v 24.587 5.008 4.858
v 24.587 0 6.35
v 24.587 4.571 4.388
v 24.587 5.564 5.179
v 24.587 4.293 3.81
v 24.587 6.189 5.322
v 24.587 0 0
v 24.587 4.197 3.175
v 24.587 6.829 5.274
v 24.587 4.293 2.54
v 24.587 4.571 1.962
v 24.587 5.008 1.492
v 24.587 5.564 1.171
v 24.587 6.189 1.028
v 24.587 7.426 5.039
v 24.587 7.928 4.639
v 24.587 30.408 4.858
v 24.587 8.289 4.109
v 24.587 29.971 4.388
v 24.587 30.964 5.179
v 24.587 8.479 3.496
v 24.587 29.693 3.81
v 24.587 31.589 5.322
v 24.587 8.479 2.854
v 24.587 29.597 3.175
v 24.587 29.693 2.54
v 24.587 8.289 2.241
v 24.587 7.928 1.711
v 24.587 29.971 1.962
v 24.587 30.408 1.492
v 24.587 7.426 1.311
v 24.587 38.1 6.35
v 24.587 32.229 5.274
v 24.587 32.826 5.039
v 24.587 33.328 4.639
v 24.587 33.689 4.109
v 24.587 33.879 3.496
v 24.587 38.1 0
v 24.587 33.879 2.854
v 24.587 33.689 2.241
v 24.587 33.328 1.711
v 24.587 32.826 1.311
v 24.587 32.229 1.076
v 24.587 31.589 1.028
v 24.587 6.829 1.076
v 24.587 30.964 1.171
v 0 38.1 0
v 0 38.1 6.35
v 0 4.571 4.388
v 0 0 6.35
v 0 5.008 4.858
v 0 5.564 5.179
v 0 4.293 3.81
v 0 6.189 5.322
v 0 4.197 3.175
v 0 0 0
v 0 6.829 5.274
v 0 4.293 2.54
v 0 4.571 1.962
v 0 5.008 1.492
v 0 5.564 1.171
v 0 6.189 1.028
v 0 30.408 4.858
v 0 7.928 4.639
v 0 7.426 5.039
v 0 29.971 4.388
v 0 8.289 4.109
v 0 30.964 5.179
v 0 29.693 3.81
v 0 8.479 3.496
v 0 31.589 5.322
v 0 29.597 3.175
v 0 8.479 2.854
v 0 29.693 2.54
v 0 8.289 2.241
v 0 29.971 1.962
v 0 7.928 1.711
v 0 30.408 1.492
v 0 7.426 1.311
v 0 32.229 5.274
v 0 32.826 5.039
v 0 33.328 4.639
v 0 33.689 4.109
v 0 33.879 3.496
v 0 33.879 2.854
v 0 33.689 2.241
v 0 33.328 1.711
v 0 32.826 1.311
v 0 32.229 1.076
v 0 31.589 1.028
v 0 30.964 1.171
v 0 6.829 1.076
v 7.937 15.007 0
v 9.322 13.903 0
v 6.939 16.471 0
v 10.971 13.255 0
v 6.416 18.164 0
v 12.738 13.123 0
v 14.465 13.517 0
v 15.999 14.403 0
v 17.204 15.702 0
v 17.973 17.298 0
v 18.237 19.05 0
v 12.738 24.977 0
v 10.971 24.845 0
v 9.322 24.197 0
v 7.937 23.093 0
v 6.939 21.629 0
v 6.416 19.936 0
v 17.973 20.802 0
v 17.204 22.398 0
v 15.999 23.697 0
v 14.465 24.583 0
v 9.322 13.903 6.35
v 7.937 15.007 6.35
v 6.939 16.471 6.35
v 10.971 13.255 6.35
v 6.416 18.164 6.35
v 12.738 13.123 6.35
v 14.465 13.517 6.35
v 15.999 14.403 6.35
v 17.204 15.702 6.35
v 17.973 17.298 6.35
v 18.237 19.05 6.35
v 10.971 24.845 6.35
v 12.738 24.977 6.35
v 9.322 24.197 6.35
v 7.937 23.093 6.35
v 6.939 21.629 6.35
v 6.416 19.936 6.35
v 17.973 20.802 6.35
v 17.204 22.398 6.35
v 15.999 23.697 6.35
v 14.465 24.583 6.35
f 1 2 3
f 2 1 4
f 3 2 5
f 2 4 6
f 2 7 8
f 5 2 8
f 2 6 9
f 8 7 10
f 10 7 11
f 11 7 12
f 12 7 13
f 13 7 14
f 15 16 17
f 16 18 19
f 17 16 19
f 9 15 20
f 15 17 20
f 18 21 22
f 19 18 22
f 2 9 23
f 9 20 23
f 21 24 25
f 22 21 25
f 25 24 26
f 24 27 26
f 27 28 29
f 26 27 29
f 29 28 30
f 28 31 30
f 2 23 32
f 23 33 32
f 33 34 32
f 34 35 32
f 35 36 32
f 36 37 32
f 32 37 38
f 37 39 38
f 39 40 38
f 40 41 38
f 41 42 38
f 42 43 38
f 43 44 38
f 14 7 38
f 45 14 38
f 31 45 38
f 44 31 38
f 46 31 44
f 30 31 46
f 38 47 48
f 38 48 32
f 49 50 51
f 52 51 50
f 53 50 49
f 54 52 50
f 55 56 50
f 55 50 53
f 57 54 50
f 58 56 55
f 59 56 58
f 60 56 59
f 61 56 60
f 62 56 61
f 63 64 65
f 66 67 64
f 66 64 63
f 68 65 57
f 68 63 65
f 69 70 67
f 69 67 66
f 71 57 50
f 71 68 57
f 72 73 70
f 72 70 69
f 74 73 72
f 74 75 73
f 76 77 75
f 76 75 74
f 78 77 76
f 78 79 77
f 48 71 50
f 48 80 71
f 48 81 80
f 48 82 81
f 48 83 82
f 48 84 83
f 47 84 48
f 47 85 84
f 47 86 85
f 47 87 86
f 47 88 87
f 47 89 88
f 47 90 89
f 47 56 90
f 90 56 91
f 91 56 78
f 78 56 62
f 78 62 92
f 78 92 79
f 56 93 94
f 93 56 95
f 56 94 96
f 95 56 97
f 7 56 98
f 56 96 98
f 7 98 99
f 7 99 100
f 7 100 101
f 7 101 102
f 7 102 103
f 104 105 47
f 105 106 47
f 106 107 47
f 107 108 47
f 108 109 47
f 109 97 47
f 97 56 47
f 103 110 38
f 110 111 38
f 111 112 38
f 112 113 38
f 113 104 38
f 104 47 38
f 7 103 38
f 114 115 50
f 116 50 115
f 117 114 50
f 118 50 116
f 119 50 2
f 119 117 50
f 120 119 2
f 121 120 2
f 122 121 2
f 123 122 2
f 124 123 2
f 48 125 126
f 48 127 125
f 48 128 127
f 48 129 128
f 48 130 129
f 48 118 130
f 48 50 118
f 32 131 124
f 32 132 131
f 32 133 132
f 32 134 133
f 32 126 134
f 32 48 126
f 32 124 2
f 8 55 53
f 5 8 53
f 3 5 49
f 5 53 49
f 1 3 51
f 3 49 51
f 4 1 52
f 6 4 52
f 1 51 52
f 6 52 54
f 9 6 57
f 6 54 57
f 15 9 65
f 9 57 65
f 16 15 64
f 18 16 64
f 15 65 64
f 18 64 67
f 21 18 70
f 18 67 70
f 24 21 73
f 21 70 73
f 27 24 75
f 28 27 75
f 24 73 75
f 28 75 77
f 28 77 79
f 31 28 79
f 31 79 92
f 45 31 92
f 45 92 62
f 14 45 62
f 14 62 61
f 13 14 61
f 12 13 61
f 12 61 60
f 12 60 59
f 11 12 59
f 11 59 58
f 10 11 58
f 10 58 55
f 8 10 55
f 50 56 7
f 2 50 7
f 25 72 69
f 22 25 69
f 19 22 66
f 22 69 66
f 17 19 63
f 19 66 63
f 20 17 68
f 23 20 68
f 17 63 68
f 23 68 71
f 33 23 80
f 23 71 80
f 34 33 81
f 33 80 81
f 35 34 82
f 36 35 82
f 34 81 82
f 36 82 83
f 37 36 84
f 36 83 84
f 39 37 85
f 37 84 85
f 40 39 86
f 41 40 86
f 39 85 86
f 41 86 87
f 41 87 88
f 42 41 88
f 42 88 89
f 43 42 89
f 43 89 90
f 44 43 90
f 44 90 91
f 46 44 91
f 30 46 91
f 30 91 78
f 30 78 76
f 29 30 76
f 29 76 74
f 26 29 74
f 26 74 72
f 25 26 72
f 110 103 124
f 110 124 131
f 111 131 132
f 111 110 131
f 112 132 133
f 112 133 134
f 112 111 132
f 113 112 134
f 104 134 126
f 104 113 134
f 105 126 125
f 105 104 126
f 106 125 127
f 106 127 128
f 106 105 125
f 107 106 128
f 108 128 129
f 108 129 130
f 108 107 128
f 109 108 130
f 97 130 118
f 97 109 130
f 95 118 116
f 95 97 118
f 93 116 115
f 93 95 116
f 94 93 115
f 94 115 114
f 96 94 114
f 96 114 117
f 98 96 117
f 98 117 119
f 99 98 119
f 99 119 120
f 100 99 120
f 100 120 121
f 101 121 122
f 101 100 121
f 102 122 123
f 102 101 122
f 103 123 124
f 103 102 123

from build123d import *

# Parameters (mm, degrees)
F0_W     = 24.5872
F0_H     = 38.1
F0_R     = 5.9436
F1_DEPTH = 6.35
F2_R     = 2.15265
F3_DEPTH = 24.5882


with BuildPart() as f1:
    # F0 (on Top) → F1 (new body)
    with BuildSketch(Plane.XY):
        with Locations((12.2936, 19.05)):
            Rectangle(F0_W, F0_H)
        with Locations((12.2936, 19.05)):
            Circle(F0_R, mode=Mode.SUBTRACT)
    extrude(amount=F1_DEPTH)

    # F2 (on face) → F3 (cut, through all)
    with BuildSketch(Plane(origin=(0, 0, 0), x_dir=(0, -1, 0), z_dir=(-1, 0, 0))):
        with Locations((-31.75, 3.175)):
            Circle(F2_R)
        with Locations((-6.35, 3.175)):
            Circle(F2_R)
    extrude(amount=-F3_DEPTH, mode=Mode.SUBTRACT)


solid = f1.part
